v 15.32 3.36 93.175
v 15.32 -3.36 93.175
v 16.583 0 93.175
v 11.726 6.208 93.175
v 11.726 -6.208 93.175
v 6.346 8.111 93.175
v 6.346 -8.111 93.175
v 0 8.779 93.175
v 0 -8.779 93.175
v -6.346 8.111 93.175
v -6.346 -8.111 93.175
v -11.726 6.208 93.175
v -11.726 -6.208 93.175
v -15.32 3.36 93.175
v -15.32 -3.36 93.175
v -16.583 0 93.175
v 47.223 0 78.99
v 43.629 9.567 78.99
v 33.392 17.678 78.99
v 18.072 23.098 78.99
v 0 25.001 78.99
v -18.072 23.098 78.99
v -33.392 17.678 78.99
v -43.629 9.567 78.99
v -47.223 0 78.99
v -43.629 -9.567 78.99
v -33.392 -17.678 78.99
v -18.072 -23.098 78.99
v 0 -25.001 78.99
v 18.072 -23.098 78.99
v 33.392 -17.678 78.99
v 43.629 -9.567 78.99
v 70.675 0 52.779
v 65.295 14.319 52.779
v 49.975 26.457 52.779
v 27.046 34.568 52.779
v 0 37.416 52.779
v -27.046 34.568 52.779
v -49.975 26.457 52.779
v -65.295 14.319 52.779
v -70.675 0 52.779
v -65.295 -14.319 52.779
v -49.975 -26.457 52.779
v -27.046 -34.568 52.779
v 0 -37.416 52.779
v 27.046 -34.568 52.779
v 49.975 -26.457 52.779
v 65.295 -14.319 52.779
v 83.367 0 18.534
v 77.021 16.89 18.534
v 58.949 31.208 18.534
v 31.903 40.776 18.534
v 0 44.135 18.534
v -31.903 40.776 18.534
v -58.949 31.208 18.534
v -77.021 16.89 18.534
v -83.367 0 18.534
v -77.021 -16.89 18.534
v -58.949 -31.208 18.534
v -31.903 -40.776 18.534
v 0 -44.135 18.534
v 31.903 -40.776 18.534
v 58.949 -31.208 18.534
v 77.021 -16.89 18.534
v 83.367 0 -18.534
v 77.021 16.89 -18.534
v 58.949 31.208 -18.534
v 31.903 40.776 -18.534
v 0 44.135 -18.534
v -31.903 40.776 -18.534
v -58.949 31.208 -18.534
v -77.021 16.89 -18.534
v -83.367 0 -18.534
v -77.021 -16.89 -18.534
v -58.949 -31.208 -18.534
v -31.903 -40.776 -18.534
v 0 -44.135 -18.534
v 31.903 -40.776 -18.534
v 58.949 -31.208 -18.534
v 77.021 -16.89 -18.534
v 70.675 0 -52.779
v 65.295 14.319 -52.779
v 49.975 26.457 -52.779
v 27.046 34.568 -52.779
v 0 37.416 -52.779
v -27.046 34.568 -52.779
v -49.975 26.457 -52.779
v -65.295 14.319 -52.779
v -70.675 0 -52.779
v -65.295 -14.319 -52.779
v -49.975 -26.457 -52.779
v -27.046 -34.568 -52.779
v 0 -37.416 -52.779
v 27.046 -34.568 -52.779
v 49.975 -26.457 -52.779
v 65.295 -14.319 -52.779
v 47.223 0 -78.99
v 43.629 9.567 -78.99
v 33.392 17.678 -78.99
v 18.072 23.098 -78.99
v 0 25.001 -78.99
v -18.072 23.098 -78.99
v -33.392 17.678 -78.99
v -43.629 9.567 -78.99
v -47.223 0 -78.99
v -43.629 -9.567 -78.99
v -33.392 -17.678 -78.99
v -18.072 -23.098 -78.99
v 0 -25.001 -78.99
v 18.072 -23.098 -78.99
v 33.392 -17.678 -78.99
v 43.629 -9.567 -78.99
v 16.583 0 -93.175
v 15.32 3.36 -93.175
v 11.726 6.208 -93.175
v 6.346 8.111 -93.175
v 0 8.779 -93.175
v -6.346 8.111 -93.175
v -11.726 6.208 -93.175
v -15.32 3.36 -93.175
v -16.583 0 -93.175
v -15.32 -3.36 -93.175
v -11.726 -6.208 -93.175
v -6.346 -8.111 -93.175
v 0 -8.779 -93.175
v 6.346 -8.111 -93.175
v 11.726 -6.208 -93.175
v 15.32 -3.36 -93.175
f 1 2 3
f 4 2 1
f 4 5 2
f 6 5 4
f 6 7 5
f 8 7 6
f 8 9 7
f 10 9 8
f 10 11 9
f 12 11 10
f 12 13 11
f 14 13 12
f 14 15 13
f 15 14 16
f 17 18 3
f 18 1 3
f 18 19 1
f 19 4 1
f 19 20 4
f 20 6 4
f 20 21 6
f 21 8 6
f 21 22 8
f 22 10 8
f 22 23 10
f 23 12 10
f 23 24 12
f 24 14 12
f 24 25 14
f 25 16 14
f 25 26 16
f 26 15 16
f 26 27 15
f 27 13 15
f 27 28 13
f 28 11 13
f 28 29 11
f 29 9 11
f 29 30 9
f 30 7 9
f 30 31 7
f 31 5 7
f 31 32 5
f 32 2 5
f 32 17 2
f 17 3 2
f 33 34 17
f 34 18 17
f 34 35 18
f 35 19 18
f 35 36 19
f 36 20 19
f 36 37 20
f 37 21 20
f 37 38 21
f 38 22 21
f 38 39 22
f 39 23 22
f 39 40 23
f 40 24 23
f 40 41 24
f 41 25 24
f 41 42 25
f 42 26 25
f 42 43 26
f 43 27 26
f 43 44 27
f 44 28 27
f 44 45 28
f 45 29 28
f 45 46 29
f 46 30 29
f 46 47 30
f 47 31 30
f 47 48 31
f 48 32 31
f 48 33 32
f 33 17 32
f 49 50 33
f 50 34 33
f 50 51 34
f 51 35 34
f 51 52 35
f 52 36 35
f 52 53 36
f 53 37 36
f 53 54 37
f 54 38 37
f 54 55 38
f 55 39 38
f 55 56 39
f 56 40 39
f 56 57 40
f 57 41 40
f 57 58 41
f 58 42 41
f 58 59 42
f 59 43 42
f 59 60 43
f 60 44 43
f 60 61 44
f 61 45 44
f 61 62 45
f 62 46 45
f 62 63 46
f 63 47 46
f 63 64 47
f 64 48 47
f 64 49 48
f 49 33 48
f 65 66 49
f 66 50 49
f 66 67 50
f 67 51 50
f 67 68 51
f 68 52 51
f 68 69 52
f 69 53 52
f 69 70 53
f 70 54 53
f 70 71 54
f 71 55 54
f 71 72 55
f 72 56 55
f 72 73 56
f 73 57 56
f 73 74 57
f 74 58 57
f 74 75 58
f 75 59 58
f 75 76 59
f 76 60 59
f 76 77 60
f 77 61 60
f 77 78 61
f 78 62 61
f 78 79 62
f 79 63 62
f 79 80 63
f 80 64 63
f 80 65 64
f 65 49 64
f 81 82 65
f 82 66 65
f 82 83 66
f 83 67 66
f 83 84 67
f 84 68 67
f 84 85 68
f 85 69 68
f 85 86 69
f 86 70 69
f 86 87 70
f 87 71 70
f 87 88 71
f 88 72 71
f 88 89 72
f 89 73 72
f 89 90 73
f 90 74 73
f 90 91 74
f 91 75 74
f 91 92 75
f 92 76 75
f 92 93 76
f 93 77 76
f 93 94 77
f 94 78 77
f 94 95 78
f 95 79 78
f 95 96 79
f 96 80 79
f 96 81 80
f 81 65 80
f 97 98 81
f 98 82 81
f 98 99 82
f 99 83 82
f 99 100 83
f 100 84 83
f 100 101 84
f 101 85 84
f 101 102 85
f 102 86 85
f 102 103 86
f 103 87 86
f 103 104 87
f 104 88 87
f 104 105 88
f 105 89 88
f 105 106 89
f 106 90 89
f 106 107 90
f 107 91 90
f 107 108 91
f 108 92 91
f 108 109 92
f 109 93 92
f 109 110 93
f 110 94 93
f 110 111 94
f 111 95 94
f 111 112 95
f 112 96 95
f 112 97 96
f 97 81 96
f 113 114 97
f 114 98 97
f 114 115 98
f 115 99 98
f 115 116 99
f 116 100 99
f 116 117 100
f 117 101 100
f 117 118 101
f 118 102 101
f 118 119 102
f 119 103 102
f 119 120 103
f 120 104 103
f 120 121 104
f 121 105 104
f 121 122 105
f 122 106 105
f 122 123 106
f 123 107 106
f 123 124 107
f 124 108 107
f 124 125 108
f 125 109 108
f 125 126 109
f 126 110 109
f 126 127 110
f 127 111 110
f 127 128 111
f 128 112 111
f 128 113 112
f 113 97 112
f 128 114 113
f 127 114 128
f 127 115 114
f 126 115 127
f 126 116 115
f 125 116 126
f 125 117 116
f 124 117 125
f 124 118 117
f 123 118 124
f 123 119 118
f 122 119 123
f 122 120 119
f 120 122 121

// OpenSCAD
// Generated by SolidPython 1.0.1 on 2020-07-29 00:46:53


scale(v = [17, 9, 19]) {
	sphere(r = 5);
}
/***********************************************
*********      SolidPython code:      **********
************************************************
 
# import packages: SolidPython
from solid import *
from solid.utils import *
from itertools import chain, combinations, permutations


class Resize:

    def __init__(self, scad_file):
        self.scad_file = scad_file
        #self.scad_file = import_scad(scad_file)
        # cone/cylinder param:
        self.r1 = 0
        self.r2 = 0
        self.h = 0
        # rectangular prism param:
        self.w = 0
        self.l = 0
        # ellipse param:
        self.r = 0

    # import OpenScad code (file name corresponds to shape)


    # classify shape + parameters
    def assign(self, param1, param2, param3):
        if self.scad_file == 'cone.scad':
            self.r1 = param1
            self.r2 = param2
            self.h = param3
        elif self.scad_file == 'cylinder.scad':
            self.r1 = param1
            self.r2 = param2
            self.h = param3
        elif self.scad_file == 'rectangularPrism.scad':
            self.h = param1
            self.l = param2
            self.w = param3
        else:
            self.r = param1
            self.h = param2

    # resize parameters
    def iterate(self):
        x = range(3, 20, 2)
        i = 1
        if self.scad_file == 'cone.scad':
            tempList = list(permutations(x, 2))
            for temp in tempList:
                param1 = temp[0]
                param2 = temp[1]
                filepath = 'produced_scad_files/' + 'cone' + str(param1) + '_' + str(param2) + '_' + '.scad'
                scad_render_to_file(cylinder(h=param1, r1=param2, r2=0), filepath)

        elif self.scad_file == 'cylinder.scad':
            tempList = list(permutations(x, 3))
            for temp in tempList:
                param1 = temp[0]
                param2 = temp[1]
                filepath = 'produced_scad_files/' + 'cylinder' + str(param1) + '_' + str(param2) + '_' + '.scad'
                scad_render_to_file(cylinder(h=param1, r1=param2, r2=param2), filepath)

        elif self.scad_file == 'rectangularPrism.scad':
            tempList = list(permutations(x, 3))
            for temp in tempList:
                param1 = temp[0]
                param2 = temp[1]
                param3 = temp[2]
                filepath = 'produced_scad_files/' + 'rectangularPrism' + str(param1) + '_' + str(param2) + '_' + str(
                    param3) + '.scad'
                scad_render_to_file(cube(size=(param1, param2, param3)), filepath)

        elif self.scad_file == 'ellipse.scad':
            tempList = list(permutations(x, 4))
            for temp in tempList:
                param1 = temp[0]
                param2 = temp[1]
                param3 = temp[2]
                param4 = temp[3]
                filepath = 'produced_scad_files/' + 'ellipse' + str(param1) + '_' + str(param2) + '_' + str(param3) + '_' + str(param4) + '.scad'
                scad_render_to_file(scale([param1, param2, param3])(sphere(r=param4)), filepath)

    def render_to_scadfile(self):
        scad_render_to_file(scad, 'example.scad') 
 
************************************************/
